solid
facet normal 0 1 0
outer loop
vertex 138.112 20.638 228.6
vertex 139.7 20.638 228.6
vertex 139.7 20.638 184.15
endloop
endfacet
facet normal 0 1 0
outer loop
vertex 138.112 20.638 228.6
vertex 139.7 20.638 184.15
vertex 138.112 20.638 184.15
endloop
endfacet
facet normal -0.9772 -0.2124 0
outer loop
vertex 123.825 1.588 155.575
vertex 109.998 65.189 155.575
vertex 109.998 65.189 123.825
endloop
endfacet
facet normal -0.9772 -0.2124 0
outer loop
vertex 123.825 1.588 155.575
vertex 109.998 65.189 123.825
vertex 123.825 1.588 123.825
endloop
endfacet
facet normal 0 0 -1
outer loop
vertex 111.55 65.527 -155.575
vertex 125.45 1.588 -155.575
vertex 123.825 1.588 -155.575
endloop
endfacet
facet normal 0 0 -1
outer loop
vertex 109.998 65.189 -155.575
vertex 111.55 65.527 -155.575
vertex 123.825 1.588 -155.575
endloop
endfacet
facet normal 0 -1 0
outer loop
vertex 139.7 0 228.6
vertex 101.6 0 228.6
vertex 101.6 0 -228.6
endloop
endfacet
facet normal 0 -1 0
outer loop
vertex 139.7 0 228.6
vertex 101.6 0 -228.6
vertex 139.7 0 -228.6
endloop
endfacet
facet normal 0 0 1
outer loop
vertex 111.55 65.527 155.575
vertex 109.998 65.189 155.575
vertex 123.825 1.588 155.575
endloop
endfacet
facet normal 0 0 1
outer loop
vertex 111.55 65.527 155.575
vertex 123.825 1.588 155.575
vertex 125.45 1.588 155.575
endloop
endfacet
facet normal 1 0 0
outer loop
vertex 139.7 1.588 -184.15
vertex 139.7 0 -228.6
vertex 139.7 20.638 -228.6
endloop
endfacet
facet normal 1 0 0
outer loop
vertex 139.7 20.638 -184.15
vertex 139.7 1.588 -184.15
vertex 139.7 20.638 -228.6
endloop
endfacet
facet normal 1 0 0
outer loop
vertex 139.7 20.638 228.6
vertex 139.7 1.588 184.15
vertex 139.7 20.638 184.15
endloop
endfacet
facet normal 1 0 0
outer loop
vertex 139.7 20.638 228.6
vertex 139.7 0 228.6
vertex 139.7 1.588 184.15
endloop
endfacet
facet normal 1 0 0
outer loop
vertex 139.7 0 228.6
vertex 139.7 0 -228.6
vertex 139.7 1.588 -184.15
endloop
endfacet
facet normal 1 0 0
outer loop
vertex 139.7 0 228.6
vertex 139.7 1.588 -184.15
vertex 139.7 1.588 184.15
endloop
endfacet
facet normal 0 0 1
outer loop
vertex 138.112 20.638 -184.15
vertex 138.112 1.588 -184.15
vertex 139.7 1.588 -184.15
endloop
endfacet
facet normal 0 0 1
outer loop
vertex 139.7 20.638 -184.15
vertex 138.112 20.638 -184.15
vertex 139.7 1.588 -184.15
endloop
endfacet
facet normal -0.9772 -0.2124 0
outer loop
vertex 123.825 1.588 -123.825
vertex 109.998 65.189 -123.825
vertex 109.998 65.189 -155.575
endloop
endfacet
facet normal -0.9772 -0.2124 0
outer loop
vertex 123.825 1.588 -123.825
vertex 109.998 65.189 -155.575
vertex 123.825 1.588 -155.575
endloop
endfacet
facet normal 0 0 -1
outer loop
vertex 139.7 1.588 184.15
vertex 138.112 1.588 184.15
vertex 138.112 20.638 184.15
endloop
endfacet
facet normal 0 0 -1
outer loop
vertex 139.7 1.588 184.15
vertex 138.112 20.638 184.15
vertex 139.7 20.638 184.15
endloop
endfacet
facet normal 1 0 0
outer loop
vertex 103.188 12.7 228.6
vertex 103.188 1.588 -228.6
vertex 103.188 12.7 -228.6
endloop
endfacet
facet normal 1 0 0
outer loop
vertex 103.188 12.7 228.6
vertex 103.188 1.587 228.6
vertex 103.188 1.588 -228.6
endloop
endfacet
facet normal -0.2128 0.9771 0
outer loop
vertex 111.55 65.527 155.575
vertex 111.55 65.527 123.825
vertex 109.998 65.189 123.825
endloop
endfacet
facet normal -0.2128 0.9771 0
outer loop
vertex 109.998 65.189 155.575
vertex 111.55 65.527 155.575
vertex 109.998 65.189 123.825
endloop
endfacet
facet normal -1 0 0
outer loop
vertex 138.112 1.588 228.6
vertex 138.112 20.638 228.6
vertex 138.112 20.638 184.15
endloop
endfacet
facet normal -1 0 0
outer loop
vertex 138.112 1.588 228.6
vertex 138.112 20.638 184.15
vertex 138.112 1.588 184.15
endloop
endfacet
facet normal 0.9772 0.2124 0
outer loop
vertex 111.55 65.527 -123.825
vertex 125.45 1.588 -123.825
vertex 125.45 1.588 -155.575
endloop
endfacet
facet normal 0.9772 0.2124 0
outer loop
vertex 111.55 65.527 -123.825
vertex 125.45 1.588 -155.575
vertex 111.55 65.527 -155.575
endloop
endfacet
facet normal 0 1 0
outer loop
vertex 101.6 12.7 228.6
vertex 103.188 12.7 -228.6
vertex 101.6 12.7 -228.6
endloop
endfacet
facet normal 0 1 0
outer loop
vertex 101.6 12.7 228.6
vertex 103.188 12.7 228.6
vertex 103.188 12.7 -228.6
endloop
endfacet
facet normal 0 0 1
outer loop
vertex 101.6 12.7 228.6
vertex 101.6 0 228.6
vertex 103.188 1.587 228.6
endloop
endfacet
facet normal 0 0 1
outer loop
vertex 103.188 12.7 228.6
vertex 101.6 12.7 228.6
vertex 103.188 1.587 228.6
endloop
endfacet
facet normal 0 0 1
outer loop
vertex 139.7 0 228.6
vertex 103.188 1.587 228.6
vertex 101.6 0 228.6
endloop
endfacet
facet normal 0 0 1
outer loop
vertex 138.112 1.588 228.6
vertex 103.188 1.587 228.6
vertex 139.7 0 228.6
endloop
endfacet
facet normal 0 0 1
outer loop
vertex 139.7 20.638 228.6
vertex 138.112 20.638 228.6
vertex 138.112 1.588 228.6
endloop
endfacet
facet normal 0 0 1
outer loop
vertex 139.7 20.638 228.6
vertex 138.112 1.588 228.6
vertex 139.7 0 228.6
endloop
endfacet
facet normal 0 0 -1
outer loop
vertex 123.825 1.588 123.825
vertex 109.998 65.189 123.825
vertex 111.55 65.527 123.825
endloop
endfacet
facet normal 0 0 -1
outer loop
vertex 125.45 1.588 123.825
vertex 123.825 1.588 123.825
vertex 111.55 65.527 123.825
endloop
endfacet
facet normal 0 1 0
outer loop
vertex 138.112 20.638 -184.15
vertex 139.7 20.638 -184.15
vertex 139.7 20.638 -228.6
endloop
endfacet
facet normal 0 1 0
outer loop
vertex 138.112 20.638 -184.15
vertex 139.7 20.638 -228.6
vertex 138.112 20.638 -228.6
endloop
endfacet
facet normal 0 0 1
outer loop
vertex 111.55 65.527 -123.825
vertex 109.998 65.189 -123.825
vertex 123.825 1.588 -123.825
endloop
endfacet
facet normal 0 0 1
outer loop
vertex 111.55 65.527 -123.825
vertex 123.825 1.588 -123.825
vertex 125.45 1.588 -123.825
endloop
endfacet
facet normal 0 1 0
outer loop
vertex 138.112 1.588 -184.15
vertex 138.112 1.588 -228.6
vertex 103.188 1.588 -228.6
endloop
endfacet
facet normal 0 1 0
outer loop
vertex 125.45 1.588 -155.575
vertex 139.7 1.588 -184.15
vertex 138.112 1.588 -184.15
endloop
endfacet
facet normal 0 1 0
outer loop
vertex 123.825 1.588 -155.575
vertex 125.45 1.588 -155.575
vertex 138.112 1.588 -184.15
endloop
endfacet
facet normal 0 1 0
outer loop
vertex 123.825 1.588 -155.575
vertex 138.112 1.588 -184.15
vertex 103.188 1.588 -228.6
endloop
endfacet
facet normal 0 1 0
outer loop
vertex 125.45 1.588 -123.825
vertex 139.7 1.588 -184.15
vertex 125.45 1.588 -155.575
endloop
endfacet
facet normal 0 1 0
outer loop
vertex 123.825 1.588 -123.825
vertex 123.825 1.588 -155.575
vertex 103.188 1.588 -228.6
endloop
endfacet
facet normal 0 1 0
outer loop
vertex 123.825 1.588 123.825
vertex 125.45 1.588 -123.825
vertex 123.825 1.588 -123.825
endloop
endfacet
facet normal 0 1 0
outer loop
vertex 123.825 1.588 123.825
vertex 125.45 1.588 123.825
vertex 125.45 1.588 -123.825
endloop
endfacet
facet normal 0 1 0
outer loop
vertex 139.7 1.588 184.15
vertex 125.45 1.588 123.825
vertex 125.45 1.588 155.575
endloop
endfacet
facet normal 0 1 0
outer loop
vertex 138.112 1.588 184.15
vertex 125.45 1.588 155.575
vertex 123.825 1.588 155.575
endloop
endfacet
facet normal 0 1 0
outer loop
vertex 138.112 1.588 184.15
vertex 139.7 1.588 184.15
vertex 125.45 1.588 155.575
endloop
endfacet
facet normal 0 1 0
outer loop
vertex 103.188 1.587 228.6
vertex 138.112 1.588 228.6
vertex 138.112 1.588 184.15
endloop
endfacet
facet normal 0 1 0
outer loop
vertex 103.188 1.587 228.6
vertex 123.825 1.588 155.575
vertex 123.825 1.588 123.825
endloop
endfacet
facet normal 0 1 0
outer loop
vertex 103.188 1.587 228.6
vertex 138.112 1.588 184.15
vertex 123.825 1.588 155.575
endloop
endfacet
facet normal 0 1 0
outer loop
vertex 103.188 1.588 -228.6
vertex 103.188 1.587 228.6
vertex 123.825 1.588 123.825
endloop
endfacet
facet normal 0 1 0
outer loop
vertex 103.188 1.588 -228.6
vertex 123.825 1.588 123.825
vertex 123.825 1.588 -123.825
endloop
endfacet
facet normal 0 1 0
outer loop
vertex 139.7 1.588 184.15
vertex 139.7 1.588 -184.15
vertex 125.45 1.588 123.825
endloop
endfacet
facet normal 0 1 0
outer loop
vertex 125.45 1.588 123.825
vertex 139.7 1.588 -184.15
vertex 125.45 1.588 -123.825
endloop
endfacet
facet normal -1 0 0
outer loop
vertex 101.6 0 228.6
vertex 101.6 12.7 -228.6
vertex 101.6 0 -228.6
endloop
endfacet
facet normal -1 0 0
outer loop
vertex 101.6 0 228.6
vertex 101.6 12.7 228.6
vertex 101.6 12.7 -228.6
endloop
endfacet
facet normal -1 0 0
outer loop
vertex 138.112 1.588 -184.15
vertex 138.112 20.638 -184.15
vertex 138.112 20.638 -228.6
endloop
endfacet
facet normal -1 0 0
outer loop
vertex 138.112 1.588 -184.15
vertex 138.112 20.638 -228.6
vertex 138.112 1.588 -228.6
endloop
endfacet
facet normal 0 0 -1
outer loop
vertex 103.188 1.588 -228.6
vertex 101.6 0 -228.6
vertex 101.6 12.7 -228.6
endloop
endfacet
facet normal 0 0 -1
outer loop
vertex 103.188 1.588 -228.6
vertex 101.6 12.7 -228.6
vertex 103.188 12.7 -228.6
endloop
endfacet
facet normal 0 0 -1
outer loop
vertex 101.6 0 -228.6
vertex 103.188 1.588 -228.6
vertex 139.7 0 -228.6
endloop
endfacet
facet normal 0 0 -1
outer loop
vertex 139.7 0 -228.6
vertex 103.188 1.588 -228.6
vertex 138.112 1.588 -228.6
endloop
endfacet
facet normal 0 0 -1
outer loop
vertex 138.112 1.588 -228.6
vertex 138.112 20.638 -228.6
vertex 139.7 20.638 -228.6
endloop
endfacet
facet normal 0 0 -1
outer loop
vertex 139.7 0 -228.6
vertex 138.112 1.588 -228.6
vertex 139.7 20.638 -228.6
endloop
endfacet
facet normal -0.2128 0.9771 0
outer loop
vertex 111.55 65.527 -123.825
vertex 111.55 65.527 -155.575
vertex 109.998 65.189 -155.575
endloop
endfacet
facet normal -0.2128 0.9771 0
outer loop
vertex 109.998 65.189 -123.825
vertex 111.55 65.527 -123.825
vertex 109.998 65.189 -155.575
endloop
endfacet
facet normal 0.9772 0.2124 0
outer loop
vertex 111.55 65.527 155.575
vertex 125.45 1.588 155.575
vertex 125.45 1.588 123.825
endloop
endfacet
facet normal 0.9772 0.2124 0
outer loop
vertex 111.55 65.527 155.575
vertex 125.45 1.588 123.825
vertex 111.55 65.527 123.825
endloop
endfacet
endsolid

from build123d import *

# Parameters (mm, degrees)
EXTRUDE1_DEPTH     = 228.6
CUT_EXTRUDE1_DEPTH = 123.825
CUT_EXTRUDE2_DEPTH = 73.025
CUT_EXTRUDE3_DEPTH = 73.025
SKETCH6_W          = 1.5875
SKETCH6_H          = 19.05
CUT_EXTRUDE4_DEPTH = 184.15


with BuildPart() as part:
    # Sketch2 → Extrude1 (new body, symmetric)
    with BuildSketch(Plane.XY):
        Polygon((101.6, 12.7), (101.6, 0), (139.7, 0), (139.7, 20.6375), (138.1125, 20.6375), (138.1125, 1.5875), (125.449578796, 1.5875), (111.549753001, 65.526698647), (109.998485525, 65.189466588), (123.825, 1.5875), (103.1875, 1.5875), (103.1875, 12.7), align=None)
    extrude(amount=EXTRUDE1_DEPTH, both=True)

    # Sketch3 → Cut-Extrude1 (cut, symmetric)
    with BuildSketch(Plane.XY):
        Polygon((103.1875, 1.5875), (138.1125, 1.5875), (138.1125, 20.6375), (111.549753001, 65.526698647), (109.998485525, 65.189466588), (103.1875, 12.7), align=None)
    extrude(amount=CUT_EXTRUDE1_DEPTH, both=True, mode=Mode.SUBTRACT)

    # Sketch4 → Cut-Extrude2 (cut)
    with BuildSketch(Plane.XY.offset(228.6)):
        Polygon((103.1875, 12.7), (103.1875, 1.5875), (138.1125, 1.5875), (138.1125, 20.6375), (111.549753001, 65.526698647), (109.998485525, 65.189466588), align=None)
    extrude(amount=-CUT_EXTRUDE2_DEPTH, mode=Mode.SUBTRACT)

    # Sketch5 → Cut-Extrude3 (cut)
    with BuildSketch(Plane(origin=(0, 0, -228.6), x_dir=(-1, 0, 0), z_dir=(0, 0, -1))):
        Polygon((-138.1125, 20.6375), (-138.1125, 1.5875), (-103.1875, 1.5875), (-103.1875, 12.7), (-109.998485525, 65.189466588), (-111.549753001, 65.526698647), align=None)
    extrude(amount=-CUT_EXTRUDE3_DEPTH, mode=Mode.SUBTRACT)

    # Sketch6 → Cut-Extrude4 (cut, symmetric)
    with BuildSketch(Plane.XY):
        with Locations((138.90625, 11.1125)):
            Rectangle(SKETCH6_W, SKETCH6_H)
    extrude(amount=CUT_EXTRUDE4_DEPTH, both=True, mode=Mode.SUBTRACT)


solid = part.part
